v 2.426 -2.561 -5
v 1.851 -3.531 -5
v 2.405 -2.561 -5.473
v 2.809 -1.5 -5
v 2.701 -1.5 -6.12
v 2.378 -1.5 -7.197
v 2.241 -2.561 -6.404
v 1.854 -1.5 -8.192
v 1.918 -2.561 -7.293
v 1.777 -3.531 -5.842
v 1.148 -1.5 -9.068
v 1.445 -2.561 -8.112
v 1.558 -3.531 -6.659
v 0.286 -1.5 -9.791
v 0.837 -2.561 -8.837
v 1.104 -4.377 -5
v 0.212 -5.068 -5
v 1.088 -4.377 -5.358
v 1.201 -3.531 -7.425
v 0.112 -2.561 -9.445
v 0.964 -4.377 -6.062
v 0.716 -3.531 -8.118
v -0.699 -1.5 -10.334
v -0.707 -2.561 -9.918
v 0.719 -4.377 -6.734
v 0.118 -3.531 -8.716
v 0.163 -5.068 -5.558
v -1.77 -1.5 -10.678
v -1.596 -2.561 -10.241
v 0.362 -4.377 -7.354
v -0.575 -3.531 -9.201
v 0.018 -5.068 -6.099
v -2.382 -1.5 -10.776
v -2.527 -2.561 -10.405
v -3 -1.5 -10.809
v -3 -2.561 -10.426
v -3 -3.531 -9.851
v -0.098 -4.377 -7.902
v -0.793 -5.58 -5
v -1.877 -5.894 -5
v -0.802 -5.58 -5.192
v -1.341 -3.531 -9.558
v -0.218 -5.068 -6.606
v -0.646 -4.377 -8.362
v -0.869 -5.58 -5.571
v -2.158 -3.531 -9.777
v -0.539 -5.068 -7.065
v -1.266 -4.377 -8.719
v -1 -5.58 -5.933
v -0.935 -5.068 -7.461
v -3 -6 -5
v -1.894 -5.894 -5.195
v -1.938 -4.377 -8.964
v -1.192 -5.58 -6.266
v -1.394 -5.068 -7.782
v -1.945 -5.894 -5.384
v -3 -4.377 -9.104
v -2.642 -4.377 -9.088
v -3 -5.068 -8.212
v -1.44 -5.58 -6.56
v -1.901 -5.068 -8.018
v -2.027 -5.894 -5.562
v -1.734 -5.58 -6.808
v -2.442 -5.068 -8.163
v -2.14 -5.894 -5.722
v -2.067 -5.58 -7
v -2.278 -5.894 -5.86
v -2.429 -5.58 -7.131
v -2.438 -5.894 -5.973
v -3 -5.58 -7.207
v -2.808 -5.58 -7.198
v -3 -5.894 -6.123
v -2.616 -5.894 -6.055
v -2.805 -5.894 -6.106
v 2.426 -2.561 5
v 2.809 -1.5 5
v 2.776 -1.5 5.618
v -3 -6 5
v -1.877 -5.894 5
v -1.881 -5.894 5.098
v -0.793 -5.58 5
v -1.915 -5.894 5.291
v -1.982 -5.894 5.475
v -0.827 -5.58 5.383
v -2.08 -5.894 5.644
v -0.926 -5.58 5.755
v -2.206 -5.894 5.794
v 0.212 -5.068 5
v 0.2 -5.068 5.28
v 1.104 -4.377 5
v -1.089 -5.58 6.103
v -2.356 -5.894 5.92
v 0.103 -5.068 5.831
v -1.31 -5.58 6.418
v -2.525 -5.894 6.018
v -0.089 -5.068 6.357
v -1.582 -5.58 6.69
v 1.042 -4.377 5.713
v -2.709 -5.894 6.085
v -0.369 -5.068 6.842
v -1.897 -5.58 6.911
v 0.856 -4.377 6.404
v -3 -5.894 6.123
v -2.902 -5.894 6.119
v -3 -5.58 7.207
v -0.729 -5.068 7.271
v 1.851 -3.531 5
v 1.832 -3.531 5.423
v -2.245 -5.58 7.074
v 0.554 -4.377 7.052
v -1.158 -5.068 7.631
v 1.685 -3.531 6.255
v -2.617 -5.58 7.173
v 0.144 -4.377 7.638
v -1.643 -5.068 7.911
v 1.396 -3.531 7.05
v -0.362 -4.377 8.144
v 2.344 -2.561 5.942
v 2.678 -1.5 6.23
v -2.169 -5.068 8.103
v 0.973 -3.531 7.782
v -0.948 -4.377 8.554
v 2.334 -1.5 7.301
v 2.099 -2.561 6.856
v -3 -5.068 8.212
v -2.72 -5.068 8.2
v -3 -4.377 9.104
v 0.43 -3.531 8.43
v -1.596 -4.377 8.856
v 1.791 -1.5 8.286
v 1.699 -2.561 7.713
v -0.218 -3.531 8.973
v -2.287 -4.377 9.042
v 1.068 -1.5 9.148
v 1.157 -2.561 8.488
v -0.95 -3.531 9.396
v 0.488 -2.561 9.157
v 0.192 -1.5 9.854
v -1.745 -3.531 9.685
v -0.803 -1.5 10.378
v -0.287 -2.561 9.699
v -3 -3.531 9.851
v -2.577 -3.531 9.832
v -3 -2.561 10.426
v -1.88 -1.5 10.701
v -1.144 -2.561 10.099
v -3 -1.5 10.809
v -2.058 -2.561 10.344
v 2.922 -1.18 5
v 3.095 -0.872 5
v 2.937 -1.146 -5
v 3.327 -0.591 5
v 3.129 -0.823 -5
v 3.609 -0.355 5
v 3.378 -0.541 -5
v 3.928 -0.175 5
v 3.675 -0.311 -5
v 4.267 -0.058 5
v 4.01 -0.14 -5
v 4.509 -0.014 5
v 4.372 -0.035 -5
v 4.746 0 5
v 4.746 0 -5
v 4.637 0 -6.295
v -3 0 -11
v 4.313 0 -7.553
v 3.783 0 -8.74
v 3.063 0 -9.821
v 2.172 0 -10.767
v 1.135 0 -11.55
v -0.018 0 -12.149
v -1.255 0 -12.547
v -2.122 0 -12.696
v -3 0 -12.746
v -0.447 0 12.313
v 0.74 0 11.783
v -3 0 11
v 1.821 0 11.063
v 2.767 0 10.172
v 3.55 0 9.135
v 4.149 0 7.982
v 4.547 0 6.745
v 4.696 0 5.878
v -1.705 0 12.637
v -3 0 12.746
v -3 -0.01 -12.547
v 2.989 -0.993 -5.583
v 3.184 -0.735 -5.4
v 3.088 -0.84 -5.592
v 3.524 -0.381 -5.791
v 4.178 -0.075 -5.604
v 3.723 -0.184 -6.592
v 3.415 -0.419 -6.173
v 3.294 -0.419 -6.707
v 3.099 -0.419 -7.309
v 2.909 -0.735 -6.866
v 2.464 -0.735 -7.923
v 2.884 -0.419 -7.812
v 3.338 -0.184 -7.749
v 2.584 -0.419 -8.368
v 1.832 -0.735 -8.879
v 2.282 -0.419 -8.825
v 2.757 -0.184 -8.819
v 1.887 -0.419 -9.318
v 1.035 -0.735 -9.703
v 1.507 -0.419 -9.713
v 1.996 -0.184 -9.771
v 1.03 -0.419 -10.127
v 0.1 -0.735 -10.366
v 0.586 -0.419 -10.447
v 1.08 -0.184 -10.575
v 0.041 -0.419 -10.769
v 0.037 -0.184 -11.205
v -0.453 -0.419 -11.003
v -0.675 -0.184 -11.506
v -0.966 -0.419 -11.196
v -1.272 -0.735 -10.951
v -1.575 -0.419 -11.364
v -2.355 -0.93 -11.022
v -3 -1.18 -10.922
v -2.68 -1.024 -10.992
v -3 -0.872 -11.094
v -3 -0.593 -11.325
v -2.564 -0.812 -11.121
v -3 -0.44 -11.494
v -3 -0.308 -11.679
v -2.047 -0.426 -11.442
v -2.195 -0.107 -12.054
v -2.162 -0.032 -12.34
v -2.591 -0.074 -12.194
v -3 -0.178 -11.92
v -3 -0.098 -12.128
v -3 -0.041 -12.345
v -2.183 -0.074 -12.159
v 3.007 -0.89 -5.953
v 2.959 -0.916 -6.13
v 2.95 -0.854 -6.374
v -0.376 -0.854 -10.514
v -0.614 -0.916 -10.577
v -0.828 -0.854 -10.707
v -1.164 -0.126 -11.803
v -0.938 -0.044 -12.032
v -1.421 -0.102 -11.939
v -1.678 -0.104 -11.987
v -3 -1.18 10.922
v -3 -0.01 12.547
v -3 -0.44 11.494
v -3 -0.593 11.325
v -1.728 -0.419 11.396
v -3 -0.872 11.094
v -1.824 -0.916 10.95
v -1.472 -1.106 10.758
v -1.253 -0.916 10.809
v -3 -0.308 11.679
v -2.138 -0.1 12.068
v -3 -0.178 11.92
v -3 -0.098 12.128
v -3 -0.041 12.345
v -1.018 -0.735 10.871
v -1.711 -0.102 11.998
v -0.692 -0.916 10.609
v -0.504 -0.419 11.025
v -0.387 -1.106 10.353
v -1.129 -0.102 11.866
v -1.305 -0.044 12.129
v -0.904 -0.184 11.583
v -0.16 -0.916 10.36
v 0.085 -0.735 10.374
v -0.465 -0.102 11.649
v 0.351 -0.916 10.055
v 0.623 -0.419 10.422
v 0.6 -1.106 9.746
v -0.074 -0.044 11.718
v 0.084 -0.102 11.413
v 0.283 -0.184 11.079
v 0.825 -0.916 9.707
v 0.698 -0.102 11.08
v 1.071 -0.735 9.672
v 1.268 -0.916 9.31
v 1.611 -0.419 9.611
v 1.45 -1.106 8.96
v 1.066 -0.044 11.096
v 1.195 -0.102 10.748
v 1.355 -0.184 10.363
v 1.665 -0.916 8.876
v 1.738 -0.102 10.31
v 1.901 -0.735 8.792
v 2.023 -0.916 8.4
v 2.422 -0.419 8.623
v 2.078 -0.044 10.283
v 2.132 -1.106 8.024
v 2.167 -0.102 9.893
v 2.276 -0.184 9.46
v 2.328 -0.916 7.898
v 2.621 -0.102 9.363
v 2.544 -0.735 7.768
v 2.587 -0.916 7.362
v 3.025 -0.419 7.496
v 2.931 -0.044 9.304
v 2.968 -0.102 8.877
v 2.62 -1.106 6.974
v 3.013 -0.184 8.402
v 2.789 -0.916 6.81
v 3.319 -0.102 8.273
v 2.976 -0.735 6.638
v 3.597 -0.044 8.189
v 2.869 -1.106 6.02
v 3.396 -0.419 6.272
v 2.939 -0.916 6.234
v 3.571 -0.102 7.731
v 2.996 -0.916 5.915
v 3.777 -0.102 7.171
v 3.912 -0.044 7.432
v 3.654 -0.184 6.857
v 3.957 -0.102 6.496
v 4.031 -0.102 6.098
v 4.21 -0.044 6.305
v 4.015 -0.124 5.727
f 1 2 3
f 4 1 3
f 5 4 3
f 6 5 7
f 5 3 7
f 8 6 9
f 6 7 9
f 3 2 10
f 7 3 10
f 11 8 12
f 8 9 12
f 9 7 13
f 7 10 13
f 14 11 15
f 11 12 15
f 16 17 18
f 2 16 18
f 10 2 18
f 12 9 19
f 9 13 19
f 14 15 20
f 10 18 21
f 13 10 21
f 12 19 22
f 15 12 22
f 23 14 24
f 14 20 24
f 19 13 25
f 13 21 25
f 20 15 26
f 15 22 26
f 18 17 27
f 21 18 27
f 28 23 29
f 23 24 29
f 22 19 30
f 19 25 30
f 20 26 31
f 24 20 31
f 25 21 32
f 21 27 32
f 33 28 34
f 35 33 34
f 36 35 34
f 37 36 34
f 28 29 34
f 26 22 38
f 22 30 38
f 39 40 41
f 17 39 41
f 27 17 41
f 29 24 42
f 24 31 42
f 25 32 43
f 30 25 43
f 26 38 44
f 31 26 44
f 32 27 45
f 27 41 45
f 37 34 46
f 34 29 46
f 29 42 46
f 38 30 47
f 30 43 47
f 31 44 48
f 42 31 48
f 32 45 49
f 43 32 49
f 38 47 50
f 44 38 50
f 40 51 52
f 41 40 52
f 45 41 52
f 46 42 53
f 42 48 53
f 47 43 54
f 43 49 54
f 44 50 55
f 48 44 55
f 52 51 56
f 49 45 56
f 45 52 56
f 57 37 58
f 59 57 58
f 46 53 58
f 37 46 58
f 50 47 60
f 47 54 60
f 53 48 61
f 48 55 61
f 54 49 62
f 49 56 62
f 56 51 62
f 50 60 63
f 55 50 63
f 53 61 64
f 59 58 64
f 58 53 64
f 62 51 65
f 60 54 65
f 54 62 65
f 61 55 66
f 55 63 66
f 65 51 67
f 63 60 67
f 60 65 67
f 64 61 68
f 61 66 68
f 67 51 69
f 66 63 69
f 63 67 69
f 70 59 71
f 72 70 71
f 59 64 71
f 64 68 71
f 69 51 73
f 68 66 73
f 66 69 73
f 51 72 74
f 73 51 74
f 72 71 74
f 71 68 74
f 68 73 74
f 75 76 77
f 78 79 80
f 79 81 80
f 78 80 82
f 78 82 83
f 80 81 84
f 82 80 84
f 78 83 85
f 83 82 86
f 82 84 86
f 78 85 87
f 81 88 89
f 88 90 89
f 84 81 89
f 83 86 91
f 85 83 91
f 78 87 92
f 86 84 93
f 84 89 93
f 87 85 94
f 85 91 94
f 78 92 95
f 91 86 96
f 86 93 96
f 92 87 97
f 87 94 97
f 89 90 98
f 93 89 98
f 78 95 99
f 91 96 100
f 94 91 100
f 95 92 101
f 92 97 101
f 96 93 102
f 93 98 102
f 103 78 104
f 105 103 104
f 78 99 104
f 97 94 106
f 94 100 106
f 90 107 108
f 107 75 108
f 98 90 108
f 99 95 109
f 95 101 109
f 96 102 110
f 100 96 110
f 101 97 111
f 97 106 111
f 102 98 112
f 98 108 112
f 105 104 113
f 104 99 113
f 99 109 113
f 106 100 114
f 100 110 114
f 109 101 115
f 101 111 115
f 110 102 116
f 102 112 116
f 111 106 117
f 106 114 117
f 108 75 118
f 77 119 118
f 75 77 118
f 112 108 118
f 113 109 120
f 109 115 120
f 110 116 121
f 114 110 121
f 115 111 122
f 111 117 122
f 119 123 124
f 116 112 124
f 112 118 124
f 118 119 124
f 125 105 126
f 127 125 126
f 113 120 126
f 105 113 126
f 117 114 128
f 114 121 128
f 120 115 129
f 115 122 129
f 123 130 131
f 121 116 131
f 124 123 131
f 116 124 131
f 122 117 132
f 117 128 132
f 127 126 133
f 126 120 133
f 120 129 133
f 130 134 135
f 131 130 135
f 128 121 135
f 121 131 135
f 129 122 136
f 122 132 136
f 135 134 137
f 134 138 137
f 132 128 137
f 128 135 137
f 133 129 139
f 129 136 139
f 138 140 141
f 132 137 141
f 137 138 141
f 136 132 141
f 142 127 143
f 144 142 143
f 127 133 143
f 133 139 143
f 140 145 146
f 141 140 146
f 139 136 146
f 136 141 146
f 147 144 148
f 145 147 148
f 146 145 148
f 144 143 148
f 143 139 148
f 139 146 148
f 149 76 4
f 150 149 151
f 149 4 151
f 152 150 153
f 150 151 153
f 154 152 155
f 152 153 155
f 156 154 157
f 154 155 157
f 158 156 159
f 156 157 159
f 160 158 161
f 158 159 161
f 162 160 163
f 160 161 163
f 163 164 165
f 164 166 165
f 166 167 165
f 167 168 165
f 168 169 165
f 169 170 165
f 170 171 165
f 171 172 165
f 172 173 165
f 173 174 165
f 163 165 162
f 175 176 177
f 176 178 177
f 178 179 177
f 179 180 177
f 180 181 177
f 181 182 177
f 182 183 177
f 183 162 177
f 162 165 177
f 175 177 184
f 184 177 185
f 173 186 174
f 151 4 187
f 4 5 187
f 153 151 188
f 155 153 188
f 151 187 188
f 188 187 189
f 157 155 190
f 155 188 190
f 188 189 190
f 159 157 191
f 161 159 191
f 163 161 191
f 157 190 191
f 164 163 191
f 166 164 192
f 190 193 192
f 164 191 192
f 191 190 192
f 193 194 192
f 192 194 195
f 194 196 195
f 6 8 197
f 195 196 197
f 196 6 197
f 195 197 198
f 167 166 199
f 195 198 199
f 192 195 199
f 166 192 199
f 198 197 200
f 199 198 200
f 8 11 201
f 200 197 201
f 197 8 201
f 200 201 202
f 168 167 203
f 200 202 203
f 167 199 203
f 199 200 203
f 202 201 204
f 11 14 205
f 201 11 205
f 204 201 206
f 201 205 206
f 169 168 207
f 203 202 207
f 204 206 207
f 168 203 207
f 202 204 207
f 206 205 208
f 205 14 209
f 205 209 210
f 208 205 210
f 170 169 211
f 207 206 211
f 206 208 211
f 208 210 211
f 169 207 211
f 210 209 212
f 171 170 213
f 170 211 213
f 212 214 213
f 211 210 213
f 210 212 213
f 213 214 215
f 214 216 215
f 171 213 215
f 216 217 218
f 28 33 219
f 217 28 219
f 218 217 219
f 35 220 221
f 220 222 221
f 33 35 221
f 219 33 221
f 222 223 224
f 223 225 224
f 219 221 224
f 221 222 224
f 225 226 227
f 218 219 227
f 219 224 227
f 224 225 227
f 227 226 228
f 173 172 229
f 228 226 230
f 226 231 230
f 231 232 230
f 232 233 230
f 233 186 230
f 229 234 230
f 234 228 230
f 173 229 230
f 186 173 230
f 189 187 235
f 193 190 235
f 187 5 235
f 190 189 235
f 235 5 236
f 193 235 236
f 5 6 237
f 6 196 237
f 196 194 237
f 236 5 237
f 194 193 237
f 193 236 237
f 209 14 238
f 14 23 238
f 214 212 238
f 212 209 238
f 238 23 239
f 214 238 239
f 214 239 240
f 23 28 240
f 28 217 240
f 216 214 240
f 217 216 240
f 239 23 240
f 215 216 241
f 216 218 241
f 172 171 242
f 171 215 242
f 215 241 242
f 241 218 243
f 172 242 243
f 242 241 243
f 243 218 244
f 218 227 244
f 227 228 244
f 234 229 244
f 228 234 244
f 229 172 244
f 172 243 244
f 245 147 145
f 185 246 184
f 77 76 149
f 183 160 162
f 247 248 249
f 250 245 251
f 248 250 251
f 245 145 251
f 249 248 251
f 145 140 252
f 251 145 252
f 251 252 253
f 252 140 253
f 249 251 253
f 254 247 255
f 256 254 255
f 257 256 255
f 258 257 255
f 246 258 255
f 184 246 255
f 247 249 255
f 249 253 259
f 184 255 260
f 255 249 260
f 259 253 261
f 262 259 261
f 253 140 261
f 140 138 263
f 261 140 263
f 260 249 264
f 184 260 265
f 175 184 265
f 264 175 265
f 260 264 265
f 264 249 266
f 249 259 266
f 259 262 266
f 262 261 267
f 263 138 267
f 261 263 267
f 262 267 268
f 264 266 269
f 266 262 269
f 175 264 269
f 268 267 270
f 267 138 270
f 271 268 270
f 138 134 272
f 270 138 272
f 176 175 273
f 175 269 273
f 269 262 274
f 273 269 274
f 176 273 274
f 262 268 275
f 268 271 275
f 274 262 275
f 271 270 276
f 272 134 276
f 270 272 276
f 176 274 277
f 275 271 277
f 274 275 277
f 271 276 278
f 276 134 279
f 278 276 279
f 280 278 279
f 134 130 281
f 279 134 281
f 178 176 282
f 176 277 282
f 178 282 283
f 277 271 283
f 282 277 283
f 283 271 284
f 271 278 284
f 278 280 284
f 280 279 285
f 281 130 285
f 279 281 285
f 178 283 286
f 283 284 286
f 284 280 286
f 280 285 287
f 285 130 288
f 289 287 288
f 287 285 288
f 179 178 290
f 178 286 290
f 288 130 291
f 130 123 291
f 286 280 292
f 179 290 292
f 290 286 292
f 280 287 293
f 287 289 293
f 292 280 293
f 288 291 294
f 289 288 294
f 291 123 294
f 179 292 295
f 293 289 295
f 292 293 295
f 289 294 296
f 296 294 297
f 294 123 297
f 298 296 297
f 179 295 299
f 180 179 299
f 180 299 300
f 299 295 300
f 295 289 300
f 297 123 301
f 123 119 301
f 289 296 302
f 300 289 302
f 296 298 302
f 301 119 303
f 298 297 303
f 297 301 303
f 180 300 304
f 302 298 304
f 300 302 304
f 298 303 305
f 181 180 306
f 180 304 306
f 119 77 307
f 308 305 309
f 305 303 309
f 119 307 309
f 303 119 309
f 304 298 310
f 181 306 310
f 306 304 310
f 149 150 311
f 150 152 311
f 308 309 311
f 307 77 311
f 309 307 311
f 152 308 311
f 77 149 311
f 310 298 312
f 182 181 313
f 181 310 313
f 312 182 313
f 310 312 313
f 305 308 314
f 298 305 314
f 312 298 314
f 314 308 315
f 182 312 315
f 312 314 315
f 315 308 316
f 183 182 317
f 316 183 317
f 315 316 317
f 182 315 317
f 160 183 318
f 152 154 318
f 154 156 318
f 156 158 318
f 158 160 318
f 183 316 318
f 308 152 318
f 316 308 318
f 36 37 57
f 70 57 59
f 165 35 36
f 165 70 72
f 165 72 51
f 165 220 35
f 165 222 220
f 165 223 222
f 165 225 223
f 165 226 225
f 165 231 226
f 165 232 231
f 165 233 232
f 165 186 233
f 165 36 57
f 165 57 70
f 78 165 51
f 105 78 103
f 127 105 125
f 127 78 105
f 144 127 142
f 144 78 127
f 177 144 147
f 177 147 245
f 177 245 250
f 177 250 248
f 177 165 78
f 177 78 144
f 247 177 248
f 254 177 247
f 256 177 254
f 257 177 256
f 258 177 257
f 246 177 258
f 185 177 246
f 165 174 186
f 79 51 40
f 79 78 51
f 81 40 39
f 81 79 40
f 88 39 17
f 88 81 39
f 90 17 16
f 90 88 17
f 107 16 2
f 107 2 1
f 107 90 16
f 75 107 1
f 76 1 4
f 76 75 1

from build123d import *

# Parameters (mm, degrees)
SKETCH1_W           = 30
SKETCH1_H           = 3.464243611
BASE_EXTRUDE_DEPTH  = 25
BOSS_EXTRUDE1_DEPTH = 5
BOSS_REVOLVE2_ANGLE = 90
BOSS_REVOLVE3_ANGLE = 90
FILLET1_R           = 2
SKETCH8_W           = 50
SKETCH8_H           = 3.464243611
CUT_EXTRUDE4_DEPTH  = 40.509492685


with BuildPart() as part:
    # Sketch1 → Base-Extrude (new, symmetric)
    with BuildSketch(Plane.XY):
        with Locations((0, 1.732121806)):
            Rectangle(SKETCH1_W, SKETCH1_H)
    extrude(amount=BASE_EXTRUDE_DEPTH, both=True)

    # Louver Body → Boss-Extrude1 (add, symmetric)
    with BuildSketch(Plane.XY):
        with BuildLine():
            Line((-3, 0), (-3, -6))
            ThreePointArc((-3, -6), (1.242640687, -4.242640687), (3, 0))
            Line((3, 0), (-3, 0))
        make_face()
    extrude(amount=BOSS_EXTRUDE1_DEPTH, both=True)

    # Sketch12 → Boss-Revolve2 (revolve)
    with BuildSketch(Plane.XY.offset(5)):
        with BuildLine():
            Line((3, 0), (-3, 0))
            Line((-3, 0), (-3, -6))
            ThreePointArc((-3, -6), (1.242640687, -4.242640687), (3, 0))
        make_face()
    revolve(axis=Axis((-3, 0, 5), (0, -1, 0)), revolution_arc=BOSS_REVOLVE2_ANGLE)

    # Sketch13 → Boss-Revolve3 (revolve)
    with BuildSketch(Plane(origin=(0, 0, -5), x_dir=(-1, 0, 0), z_dir=(0, 0, -1))):
        with BuildLine():
            Line((3, 0), (-3, 0))
            ThreePointArc((-3, 0), (-1.242640687, -4.242640687), (3, -6))
            Line((3, -6), (3, 0))
        make_face()
    revolve(axis=Axis((-3, -6, -5), (0, 1, 0)), revolution_arc=BOSS_REVOLVE3_ANGLE)

    # Fillet1
    fillet1_edges = [part.edges().sort_by_distance(p)[0] for p in [
        (3, 0, 0),
        (1.242640687, 0, 9.242640687),
        (1.242640687, 0, -9.242640687),
    ]]
    fillet(fillet1_edges, radius=FILLET1_R)

    # Sketch8 → Cut-Extrude4 (cut, through all)
    with BuildSketch(Plane.ZY.offset(15)):
        with Locations((0, 1.732121806)):
            Rectangle(SKETCH8_W, SKETCH8_H)
    extrude(amount=-CUT_EXTRUDE4_DEPTH, mode=Mode.SUBTRACT)


solid = part.part
